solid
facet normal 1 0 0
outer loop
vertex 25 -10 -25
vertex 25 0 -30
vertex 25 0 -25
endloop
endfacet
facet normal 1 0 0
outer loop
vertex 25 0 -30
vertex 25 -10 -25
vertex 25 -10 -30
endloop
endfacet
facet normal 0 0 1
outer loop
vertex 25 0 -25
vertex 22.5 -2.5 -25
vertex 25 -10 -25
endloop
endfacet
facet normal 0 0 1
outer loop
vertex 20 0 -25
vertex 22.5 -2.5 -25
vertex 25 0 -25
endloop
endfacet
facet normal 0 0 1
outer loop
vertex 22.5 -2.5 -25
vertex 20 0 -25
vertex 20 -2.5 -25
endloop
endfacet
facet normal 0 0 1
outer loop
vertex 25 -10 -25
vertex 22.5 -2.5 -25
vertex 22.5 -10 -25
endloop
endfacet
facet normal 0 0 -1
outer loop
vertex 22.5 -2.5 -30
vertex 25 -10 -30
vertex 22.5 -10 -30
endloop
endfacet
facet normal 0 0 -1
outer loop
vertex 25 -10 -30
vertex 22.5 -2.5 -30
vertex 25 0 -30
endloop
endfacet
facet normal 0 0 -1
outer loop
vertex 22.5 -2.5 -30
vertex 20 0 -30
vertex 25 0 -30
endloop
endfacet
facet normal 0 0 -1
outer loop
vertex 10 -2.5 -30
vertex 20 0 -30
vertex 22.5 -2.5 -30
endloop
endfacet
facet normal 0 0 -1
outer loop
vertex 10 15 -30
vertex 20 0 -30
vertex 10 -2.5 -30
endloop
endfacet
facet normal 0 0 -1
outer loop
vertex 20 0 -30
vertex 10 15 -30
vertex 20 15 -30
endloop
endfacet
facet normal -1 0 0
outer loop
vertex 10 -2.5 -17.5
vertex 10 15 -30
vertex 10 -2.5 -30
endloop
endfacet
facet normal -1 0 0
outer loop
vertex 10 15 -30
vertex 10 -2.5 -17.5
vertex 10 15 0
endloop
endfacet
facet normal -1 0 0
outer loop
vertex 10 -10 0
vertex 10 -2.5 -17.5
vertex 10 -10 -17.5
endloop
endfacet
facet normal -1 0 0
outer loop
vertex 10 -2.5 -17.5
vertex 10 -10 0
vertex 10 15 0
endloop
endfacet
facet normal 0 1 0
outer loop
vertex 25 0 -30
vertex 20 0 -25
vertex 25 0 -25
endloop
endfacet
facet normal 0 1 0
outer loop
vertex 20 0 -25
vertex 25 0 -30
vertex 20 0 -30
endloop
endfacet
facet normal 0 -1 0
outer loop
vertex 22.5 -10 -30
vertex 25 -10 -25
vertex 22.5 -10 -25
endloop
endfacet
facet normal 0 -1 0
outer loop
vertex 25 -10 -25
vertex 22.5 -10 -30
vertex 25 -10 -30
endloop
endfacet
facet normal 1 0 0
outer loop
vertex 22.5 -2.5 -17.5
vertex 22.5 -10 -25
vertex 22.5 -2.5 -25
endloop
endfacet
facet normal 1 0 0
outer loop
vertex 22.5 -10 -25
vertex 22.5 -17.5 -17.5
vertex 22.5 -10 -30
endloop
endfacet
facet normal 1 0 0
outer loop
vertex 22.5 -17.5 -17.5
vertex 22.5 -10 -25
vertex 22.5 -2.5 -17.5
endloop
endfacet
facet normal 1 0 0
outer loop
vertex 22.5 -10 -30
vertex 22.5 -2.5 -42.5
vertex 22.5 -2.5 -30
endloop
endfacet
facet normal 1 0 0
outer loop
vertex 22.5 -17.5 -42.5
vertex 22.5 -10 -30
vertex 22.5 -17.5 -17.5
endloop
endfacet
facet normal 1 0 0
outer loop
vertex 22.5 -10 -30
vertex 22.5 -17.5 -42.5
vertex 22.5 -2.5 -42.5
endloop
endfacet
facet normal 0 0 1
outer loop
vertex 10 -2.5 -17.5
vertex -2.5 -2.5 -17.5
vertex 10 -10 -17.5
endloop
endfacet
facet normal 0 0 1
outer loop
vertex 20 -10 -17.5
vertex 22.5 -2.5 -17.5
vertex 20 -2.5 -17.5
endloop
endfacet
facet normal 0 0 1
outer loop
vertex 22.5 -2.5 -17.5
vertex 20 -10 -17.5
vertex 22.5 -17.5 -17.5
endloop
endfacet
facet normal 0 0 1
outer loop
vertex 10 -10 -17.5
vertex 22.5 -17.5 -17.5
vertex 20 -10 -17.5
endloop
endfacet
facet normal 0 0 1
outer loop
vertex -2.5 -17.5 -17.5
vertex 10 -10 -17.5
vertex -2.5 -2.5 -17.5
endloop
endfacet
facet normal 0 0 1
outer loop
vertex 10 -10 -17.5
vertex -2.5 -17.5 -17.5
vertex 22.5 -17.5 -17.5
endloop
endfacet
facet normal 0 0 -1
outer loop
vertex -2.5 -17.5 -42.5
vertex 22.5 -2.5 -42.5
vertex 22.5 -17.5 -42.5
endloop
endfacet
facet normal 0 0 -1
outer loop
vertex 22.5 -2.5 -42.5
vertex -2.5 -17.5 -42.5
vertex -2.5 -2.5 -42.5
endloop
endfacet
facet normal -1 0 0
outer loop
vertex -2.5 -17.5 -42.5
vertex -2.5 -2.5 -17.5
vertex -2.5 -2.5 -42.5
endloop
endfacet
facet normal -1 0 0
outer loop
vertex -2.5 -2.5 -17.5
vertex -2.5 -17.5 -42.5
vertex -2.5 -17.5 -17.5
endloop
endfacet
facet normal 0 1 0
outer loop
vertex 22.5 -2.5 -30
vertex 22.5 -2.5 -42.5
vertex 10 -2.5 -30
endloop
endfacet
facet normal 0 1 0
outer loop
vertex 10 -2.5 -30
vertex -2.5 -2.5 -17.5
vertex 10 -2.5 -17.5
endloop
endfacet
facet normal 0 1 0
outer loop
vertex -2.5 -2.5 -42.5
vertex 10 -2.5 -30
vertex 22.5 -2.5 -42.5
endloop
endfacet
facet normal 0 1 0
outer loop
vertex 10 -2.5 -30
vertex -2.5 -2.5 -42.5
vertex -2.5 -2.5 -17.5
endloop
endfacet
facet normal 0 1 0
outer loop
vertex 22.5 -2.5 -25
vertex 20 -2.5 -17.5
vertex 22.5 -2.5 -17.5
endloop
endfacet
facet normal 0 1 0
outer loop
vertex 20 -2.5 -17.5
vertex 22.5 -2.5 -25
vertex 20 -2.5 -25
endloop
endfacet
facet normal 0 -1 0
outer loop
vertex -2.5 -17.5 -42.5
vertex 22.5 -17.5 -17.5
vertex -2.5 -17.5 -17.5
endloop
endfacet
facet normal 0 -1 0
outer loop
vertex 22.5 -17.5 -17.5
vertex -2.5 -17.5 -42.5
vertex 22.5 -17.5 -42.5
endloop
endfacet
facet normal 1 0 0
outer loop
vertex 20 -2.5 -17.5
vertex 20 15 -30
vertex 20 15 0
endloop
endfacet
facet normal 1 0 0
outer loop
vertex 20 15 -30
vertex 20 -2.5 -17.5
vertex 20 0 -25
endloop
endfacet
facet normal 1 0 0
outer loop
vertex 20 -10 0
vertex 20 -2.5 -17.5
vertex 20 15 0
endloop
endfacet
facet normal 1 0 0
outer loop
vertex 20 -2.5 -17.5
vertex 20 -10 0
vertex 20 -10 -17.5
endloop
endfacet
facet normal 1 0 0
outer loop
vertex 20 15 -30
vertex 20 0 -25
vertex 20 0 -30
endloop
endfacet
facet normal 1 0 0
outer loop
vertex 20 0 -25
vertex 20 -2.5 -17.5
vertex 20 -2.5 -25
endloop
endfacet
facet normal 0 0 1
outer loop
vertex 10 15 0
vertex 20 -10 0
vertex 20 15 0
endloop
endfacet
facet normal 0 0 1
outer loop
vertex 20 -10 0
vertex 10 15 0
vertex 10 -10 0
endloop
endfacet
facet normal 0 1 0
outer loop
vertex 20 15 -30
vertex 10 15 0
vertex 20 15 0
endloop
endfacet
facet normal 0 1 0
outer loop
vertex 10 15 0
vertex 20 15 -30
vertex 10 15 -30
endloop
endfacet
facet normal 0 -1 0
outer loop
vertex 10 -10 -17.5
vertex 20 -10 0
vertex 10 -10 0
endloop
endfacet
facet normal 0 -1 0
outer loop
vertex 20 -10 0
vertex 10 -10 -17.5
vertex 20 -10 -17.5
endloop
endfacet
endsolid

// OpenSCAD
// Generated by generate_scads.py
translate([10,-10,-30]) {
  union() {
    cube(size=[15,10,5], center=false);
    cube(size=[25,15,25], center=true);
    cube(size=[10,25,30], center=false);
  }
}
